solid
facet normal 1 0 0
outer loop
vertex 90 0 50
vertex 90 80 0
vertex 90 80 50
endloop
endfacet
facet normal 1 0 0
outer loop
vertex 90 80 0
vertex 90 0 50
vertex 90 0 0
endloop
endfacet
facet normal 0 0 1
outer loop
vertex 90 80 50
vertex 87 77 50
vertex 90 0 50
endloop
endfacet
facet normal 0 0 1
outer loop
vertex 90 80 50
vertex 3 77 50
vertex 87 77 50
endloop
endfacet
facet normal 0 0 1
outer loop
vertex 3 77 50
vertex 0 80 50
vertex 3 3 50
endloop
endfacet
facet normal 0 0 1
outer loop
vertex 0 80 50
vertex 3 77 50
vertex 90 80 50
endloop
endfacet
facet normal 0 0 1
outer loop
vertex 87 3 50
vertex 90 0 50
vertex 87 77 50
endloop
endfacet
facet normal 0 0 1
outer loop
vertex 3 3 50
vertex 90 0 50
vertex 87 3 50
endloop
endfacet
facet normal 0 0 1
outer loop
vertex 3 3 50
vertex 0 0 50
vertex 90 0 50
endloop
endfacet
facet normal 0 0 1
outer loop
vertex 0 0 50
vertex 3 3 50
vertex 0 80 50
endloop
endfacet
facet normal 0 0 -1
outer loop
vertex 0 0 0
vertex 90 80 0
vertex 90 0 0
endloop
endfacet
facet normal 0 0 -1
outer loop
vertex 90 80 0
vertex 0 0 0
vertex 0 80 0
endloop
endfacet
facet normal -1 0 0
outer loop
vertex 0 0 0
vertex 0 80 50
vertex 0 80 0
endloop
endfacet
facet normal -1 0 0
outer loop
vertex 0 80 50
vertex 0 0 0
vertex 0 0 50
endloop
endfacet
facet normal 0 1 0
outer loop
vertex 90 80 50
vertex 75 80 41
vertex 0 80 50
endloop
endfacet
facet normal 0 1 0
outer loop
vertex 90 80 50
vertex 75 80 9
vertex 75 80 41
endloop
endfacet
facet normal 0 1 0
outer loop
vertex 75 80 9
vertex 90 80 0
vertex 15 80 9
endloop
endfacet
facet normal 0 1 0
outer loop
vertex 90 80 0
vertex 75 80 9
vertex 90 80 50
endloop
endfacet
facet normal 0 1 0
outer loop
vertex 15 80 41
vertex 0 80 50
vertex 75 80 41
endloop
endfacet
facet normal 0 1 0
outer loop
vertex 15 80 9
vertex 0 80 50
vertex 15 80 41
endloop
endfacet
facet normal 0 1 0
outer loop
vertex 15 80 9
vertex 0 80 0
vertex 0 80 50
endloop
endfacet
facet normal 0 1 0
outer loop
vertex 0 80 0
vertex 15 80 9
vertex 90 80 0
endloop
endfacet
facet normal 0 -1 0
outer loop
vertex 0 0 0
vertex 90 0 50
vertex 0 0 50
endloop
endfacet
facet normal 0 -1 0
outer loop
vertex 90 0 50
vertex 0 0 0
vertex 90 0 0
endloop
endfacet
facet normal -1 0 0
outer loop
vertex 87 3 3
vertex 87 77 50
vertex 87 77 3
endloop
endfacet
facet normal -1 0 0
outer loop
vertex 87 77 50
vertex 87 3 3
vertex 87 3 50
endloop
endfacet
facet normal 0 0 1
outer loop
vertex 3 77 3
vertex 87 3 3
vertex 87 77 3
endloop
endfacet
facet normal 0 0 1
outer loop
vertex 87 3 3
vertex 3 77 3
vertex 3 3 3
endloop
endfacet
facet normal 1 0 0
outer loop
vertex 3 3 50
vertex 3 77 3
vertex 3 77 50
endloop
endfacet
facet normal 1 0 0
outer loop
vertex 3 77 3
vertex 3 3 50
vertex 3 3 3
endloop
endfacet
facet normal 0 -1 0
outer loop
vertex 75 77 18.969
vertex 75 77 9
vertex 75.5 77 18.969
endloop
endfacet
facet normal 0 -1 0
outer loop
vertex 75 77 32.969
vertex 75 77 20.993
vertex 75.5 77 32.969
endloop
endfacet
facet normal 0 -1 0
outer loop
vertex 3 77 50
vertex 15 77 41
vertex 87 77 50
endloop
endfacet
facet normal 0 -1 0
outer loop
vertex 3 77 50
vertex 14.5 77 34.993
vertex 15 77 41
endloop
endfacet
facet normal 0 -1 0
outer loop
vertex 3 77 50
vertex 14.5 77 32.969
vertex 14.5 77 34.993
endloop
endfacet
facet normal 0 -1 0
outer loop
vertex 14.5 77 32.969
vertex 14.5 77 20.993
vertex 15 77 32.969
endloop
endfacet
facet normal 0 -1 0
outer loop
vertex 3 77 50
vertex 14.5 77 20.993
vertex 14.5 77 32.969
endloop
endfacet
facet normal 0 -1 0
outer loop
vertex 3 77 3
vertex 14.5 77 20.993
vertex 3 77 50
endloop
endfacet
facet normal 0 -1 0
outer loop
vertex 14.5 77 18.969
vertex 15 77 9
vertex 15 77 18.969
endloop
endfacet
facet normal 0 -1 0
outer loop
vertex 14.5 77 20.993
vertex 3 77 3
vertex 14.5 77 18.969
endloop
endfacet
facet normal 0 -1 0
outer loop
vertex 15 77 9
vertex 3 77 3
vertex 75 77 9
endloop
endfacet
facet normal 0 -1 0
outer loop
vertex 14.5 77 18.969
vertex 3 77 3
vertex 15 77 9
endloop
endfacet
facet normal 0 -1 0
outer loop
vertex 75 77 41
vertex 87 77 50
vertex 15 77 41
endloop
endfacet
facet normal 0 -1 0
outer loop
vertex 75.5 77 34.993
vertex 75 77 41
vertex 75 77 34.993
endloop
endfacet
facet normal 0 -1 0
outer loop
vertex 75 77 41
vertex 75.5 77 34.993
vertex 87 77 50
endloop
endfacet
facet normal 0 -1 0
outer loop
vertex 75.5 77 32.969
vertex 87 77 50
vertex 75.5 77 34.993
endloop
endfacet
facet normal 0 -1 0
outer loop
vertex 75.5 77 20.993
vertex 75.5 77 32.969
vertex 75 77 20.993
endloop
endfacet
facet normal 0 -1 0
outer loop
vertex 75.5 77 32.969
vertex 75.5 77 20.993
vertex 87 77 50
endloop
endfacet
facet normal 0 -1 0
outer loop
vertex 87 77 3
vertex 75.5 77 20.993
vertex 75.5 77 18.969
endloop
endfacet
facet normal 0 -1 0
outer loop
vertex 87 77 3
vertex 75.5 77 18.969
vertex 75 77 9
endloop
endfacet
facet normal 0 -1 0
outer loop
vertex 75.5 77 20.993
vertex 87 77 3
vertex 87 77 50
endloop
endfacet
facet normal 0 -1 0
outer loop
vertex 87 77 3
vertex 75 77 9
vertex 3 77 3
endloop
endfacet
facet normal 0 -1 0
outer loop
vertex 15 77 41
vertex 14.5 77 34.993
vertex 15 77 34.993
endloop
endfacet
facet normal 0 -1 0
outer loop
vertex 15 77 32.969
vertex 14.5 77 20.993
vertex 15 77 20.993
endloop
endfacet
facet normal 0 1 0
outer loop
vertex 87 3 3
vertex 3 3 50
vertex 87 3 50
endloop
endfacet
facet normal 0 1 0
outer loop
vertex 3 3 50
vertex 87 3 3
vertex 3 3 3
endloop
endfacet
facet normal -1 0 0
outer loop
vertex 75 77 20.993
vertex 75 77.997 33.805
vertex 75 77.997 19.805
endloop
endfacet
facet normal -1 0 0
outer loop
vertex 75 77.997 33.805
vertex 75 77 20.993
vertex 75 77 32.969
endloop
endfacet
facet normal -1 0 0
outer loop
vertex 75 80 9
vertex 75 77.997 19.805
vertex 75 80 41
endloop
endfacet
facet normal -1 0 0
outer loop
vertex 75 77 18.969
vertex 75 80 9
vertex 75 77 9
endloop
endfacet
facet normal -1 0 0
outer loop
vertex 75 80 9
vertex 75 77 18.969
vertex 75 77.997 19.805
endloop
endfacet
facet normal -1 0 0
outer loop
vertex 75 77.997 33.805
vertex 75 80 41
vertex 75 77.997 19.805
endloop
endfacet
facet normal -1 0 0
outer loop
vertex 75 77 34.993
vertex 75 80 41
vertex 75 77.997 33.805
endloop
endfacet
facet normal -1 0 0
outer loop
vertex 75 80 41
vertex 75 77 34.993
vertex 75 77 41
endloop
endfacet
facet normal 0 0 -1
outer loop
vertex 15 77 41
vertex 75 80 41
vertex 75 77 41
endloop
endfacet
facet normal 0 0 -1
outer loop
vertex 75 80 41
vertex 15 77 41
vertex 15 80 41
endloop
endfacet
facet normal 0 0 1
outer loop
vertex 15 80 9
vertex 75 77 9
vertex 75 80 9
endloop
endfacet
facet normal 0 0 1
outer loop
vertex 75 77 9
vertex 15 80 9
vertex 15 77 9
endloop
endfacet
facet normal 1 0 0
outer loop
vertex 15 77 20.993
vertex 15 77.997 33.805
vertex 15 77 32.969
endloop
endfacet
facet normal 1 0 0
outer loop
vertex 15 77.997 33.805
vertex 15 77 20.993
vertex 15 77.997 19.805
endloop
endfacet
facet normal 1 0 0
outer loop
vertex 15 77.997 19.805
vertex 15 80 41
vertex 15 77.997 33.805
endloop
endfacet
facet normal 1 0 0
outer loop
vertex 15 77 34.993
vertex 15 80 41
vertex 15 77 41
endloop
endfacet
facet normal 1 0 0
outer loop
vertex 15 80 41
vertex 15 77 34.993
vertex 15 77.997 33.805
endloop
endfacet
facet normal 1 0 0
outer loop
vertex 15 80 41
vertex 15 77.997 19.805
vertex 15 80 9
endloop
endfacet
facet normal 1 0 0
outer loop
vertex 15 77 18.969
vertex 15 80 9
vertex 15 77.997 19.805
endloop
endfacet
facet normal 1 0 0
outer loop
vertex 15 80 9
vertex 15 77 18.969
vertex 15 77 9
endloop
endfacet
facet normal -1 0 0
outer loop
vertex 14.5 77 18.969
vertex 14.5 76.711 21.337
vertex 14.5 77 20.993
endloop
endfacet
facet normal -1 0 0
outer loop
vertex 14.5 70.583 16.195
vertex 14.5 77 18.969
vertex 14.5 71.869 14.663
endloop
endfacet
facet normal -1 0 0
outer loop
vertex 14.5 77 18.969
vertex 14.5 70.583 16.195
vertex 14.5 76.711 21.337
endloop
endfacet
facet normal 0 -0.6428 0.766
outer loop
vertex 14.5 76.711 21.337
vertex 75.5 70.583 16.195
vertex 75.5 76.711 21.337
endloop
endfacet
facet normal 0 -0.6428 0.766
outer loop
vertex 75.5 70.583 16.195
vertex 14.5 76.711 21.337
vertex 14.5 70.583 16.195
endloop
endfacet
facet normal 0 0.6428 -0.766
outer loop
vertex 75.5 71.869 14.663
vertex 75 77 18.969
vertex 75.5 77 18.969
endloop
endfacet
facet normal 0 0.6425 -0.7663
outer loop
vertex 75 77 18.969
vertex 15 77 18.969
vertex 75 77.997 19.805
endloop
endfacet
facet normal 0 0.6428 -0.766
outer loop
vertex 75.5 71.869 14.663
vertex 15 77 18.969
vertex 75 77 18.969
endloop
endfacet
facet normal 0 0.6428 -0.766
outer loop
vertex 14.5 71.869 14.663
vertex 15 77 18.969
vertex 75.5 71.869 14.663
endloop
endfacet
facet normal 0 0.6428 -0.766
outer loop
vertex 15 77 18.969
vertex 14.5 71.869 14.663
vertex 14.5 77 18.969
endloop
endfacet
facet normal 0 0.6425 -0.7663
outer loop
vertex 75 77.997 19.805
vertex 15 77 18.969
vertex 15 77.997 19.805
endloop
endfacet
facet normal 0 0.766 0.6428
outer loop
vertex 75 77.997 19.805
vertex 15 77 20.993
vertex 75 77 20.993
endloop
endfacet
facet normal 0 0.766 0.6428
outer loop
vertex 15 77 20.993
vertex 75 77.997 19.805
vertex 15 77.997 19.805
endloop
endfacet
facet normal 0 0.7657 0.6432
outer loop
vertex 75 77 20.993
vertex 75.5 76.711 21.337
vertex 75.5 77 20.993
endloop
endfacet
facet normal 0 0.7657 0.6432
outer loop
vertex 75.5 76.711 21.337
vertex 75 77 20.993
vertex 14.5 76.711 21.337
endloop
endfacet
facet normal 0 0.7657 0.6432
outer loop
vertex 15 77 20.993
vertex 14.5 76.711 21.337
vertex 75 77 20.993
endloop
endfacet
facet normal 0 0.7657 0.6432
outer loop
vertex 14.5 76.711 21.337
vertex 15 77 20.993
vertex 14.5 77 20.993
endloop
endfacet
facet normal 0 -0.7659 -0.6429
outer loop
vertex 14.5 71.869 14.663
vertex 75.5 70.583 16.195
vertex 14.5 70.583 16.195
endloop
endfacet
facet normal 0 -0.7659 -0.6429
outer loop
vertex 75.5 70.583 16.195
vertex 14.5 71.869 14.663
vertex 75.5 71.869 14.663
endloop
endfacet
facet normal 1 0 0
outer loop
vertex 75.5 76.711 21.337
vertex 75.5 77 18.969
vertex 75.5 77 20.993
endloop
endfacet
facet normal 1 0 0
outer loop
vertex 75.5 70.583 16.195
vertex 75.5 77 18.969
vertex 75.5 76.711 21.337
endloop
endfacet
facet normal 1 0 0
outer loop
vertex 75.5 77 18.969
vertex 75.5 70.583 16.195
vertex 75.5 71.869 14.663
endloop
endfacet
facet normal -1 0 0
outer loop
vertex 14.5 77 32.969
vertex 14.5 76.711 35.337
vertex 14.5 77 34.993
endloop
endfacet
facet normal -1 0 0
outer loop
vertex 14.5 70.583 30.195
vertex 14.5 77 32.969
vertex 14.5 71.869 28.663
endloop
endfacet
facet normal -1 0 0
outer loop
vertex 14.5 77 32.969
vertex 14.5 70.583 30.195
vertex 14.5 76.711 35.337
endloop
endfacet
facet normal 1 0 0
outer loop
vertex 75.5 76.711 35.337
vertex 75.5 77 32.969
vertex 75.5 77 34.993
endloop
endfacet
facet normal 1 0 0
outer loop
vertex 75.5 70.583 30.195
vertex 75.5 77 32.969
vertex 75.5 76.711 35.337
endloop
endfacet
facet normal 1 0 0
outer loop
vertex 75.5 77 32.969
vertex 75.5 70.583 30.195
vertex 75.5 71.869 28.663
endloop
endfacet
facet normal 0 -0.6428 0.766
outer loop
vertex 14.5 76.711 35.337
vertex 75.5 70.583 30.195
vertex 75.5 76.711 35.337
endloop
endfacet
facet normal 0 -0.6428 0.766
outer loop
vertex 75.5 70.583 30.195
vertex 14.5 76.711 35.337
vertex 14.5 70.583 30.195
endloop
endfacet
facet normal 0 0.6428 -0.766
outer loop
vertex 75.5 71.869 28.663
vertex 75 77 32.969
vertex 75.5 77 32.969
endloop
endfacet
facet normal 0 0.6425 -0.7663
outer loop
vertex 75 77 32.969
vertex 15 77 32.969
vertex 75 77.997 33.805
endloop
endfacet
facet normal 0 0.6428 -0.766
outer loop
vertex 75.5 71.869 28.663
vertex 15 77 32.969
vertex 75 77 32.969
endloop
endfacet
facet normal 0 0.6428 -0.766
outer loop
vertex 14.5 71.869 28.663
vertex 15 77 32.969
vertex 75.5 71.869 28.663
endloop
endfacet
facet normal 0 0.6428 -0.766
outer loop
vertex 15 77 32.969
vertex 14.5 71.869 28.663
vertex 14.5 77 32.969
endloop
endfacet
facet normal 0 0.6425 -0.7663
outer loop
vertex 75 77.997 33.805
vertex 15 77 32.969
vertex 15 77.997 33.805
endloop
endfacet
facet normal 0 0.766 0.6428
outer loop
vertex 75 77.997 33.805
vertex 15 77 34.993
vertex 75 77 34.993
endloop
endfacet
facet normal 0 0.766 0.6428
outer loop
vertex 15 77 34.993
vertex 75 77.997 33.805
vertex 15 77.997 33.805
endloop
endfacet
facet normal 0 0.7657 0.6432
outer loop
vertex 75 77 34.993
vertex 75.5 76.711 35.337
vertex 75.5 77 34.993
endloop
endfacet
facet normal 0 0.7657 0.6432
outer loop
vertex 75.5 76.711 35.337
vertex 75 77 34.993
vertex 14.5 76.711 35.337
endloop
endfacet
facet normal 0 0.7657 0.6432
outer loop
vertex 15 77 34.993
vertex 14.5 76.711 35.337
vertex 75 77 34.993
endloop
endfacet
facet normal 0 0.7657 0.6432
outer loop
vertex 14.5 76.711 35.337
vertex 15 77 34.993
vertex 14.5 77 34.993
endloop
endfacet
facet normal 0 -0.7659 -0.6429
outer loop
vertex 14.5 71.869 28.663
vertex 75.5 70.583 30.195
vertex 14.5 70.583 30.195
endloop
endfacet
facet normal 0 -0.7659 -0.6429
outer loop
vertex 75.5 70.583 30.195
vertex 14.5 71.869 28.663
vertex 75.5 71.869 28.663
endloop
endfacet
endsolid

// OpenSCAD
$fn = 32;

// ----------------------------------------------------------------------
// Vent box: louvers enclosure
// ----------------------------------------------------------------------

// --- parameters (mm) ---
box_l = 90;               // box length, X
box_w = 80;               // box width, Y
box_h = 50;               // box height, Z
wall_t = 3;               // shell wall thickness
win_l = 60;               // vent window width, X
win_h = 32;               // vent window height, Z
slat_t = 2;               // louver slat thickness
slat_d = 8;               // louver slat depth
slat_a = 40;              // louver slat angle, degrees
slat_pitch = 14;          // louver pitch
slat_yc = 74.29;          // slat centreline Y
fit_tol = 0.1;            // tolerance for press fits, mm
free_tol = 0.3;           // tolerance for clearance fits, mm

win_z0 = (box_h - win_h) / 2;  // window lower edge Z
n_slats = 2;  // louver count
slat_z0 = win_z0 + (win_h - (n_slats - 1) * slat_pitch) / 2;

difference() {
  union() {
    difference() {
      cube([box_l, box_w, box_h]);
  translate([wall_t, wall_t, wall_t])
    cube([box_l - 2 * wall_t, box_w - 2 * wall_t, box_h]);
  translate([(box_l - win_l) / 2, box_w - wall_t - 1, win_z0])
    cube([win_l, wall_t + 2, win_h]);
    }
    for (i = [0 : n_slats - 1])
      translate([box_l / 2, slat_yc, slat_z0 + i * slat_pitch])
        rotate([slat_a, 0, 0])
          cube([win_l + 1, slat_d, slat_t], center = true);
  }
}
